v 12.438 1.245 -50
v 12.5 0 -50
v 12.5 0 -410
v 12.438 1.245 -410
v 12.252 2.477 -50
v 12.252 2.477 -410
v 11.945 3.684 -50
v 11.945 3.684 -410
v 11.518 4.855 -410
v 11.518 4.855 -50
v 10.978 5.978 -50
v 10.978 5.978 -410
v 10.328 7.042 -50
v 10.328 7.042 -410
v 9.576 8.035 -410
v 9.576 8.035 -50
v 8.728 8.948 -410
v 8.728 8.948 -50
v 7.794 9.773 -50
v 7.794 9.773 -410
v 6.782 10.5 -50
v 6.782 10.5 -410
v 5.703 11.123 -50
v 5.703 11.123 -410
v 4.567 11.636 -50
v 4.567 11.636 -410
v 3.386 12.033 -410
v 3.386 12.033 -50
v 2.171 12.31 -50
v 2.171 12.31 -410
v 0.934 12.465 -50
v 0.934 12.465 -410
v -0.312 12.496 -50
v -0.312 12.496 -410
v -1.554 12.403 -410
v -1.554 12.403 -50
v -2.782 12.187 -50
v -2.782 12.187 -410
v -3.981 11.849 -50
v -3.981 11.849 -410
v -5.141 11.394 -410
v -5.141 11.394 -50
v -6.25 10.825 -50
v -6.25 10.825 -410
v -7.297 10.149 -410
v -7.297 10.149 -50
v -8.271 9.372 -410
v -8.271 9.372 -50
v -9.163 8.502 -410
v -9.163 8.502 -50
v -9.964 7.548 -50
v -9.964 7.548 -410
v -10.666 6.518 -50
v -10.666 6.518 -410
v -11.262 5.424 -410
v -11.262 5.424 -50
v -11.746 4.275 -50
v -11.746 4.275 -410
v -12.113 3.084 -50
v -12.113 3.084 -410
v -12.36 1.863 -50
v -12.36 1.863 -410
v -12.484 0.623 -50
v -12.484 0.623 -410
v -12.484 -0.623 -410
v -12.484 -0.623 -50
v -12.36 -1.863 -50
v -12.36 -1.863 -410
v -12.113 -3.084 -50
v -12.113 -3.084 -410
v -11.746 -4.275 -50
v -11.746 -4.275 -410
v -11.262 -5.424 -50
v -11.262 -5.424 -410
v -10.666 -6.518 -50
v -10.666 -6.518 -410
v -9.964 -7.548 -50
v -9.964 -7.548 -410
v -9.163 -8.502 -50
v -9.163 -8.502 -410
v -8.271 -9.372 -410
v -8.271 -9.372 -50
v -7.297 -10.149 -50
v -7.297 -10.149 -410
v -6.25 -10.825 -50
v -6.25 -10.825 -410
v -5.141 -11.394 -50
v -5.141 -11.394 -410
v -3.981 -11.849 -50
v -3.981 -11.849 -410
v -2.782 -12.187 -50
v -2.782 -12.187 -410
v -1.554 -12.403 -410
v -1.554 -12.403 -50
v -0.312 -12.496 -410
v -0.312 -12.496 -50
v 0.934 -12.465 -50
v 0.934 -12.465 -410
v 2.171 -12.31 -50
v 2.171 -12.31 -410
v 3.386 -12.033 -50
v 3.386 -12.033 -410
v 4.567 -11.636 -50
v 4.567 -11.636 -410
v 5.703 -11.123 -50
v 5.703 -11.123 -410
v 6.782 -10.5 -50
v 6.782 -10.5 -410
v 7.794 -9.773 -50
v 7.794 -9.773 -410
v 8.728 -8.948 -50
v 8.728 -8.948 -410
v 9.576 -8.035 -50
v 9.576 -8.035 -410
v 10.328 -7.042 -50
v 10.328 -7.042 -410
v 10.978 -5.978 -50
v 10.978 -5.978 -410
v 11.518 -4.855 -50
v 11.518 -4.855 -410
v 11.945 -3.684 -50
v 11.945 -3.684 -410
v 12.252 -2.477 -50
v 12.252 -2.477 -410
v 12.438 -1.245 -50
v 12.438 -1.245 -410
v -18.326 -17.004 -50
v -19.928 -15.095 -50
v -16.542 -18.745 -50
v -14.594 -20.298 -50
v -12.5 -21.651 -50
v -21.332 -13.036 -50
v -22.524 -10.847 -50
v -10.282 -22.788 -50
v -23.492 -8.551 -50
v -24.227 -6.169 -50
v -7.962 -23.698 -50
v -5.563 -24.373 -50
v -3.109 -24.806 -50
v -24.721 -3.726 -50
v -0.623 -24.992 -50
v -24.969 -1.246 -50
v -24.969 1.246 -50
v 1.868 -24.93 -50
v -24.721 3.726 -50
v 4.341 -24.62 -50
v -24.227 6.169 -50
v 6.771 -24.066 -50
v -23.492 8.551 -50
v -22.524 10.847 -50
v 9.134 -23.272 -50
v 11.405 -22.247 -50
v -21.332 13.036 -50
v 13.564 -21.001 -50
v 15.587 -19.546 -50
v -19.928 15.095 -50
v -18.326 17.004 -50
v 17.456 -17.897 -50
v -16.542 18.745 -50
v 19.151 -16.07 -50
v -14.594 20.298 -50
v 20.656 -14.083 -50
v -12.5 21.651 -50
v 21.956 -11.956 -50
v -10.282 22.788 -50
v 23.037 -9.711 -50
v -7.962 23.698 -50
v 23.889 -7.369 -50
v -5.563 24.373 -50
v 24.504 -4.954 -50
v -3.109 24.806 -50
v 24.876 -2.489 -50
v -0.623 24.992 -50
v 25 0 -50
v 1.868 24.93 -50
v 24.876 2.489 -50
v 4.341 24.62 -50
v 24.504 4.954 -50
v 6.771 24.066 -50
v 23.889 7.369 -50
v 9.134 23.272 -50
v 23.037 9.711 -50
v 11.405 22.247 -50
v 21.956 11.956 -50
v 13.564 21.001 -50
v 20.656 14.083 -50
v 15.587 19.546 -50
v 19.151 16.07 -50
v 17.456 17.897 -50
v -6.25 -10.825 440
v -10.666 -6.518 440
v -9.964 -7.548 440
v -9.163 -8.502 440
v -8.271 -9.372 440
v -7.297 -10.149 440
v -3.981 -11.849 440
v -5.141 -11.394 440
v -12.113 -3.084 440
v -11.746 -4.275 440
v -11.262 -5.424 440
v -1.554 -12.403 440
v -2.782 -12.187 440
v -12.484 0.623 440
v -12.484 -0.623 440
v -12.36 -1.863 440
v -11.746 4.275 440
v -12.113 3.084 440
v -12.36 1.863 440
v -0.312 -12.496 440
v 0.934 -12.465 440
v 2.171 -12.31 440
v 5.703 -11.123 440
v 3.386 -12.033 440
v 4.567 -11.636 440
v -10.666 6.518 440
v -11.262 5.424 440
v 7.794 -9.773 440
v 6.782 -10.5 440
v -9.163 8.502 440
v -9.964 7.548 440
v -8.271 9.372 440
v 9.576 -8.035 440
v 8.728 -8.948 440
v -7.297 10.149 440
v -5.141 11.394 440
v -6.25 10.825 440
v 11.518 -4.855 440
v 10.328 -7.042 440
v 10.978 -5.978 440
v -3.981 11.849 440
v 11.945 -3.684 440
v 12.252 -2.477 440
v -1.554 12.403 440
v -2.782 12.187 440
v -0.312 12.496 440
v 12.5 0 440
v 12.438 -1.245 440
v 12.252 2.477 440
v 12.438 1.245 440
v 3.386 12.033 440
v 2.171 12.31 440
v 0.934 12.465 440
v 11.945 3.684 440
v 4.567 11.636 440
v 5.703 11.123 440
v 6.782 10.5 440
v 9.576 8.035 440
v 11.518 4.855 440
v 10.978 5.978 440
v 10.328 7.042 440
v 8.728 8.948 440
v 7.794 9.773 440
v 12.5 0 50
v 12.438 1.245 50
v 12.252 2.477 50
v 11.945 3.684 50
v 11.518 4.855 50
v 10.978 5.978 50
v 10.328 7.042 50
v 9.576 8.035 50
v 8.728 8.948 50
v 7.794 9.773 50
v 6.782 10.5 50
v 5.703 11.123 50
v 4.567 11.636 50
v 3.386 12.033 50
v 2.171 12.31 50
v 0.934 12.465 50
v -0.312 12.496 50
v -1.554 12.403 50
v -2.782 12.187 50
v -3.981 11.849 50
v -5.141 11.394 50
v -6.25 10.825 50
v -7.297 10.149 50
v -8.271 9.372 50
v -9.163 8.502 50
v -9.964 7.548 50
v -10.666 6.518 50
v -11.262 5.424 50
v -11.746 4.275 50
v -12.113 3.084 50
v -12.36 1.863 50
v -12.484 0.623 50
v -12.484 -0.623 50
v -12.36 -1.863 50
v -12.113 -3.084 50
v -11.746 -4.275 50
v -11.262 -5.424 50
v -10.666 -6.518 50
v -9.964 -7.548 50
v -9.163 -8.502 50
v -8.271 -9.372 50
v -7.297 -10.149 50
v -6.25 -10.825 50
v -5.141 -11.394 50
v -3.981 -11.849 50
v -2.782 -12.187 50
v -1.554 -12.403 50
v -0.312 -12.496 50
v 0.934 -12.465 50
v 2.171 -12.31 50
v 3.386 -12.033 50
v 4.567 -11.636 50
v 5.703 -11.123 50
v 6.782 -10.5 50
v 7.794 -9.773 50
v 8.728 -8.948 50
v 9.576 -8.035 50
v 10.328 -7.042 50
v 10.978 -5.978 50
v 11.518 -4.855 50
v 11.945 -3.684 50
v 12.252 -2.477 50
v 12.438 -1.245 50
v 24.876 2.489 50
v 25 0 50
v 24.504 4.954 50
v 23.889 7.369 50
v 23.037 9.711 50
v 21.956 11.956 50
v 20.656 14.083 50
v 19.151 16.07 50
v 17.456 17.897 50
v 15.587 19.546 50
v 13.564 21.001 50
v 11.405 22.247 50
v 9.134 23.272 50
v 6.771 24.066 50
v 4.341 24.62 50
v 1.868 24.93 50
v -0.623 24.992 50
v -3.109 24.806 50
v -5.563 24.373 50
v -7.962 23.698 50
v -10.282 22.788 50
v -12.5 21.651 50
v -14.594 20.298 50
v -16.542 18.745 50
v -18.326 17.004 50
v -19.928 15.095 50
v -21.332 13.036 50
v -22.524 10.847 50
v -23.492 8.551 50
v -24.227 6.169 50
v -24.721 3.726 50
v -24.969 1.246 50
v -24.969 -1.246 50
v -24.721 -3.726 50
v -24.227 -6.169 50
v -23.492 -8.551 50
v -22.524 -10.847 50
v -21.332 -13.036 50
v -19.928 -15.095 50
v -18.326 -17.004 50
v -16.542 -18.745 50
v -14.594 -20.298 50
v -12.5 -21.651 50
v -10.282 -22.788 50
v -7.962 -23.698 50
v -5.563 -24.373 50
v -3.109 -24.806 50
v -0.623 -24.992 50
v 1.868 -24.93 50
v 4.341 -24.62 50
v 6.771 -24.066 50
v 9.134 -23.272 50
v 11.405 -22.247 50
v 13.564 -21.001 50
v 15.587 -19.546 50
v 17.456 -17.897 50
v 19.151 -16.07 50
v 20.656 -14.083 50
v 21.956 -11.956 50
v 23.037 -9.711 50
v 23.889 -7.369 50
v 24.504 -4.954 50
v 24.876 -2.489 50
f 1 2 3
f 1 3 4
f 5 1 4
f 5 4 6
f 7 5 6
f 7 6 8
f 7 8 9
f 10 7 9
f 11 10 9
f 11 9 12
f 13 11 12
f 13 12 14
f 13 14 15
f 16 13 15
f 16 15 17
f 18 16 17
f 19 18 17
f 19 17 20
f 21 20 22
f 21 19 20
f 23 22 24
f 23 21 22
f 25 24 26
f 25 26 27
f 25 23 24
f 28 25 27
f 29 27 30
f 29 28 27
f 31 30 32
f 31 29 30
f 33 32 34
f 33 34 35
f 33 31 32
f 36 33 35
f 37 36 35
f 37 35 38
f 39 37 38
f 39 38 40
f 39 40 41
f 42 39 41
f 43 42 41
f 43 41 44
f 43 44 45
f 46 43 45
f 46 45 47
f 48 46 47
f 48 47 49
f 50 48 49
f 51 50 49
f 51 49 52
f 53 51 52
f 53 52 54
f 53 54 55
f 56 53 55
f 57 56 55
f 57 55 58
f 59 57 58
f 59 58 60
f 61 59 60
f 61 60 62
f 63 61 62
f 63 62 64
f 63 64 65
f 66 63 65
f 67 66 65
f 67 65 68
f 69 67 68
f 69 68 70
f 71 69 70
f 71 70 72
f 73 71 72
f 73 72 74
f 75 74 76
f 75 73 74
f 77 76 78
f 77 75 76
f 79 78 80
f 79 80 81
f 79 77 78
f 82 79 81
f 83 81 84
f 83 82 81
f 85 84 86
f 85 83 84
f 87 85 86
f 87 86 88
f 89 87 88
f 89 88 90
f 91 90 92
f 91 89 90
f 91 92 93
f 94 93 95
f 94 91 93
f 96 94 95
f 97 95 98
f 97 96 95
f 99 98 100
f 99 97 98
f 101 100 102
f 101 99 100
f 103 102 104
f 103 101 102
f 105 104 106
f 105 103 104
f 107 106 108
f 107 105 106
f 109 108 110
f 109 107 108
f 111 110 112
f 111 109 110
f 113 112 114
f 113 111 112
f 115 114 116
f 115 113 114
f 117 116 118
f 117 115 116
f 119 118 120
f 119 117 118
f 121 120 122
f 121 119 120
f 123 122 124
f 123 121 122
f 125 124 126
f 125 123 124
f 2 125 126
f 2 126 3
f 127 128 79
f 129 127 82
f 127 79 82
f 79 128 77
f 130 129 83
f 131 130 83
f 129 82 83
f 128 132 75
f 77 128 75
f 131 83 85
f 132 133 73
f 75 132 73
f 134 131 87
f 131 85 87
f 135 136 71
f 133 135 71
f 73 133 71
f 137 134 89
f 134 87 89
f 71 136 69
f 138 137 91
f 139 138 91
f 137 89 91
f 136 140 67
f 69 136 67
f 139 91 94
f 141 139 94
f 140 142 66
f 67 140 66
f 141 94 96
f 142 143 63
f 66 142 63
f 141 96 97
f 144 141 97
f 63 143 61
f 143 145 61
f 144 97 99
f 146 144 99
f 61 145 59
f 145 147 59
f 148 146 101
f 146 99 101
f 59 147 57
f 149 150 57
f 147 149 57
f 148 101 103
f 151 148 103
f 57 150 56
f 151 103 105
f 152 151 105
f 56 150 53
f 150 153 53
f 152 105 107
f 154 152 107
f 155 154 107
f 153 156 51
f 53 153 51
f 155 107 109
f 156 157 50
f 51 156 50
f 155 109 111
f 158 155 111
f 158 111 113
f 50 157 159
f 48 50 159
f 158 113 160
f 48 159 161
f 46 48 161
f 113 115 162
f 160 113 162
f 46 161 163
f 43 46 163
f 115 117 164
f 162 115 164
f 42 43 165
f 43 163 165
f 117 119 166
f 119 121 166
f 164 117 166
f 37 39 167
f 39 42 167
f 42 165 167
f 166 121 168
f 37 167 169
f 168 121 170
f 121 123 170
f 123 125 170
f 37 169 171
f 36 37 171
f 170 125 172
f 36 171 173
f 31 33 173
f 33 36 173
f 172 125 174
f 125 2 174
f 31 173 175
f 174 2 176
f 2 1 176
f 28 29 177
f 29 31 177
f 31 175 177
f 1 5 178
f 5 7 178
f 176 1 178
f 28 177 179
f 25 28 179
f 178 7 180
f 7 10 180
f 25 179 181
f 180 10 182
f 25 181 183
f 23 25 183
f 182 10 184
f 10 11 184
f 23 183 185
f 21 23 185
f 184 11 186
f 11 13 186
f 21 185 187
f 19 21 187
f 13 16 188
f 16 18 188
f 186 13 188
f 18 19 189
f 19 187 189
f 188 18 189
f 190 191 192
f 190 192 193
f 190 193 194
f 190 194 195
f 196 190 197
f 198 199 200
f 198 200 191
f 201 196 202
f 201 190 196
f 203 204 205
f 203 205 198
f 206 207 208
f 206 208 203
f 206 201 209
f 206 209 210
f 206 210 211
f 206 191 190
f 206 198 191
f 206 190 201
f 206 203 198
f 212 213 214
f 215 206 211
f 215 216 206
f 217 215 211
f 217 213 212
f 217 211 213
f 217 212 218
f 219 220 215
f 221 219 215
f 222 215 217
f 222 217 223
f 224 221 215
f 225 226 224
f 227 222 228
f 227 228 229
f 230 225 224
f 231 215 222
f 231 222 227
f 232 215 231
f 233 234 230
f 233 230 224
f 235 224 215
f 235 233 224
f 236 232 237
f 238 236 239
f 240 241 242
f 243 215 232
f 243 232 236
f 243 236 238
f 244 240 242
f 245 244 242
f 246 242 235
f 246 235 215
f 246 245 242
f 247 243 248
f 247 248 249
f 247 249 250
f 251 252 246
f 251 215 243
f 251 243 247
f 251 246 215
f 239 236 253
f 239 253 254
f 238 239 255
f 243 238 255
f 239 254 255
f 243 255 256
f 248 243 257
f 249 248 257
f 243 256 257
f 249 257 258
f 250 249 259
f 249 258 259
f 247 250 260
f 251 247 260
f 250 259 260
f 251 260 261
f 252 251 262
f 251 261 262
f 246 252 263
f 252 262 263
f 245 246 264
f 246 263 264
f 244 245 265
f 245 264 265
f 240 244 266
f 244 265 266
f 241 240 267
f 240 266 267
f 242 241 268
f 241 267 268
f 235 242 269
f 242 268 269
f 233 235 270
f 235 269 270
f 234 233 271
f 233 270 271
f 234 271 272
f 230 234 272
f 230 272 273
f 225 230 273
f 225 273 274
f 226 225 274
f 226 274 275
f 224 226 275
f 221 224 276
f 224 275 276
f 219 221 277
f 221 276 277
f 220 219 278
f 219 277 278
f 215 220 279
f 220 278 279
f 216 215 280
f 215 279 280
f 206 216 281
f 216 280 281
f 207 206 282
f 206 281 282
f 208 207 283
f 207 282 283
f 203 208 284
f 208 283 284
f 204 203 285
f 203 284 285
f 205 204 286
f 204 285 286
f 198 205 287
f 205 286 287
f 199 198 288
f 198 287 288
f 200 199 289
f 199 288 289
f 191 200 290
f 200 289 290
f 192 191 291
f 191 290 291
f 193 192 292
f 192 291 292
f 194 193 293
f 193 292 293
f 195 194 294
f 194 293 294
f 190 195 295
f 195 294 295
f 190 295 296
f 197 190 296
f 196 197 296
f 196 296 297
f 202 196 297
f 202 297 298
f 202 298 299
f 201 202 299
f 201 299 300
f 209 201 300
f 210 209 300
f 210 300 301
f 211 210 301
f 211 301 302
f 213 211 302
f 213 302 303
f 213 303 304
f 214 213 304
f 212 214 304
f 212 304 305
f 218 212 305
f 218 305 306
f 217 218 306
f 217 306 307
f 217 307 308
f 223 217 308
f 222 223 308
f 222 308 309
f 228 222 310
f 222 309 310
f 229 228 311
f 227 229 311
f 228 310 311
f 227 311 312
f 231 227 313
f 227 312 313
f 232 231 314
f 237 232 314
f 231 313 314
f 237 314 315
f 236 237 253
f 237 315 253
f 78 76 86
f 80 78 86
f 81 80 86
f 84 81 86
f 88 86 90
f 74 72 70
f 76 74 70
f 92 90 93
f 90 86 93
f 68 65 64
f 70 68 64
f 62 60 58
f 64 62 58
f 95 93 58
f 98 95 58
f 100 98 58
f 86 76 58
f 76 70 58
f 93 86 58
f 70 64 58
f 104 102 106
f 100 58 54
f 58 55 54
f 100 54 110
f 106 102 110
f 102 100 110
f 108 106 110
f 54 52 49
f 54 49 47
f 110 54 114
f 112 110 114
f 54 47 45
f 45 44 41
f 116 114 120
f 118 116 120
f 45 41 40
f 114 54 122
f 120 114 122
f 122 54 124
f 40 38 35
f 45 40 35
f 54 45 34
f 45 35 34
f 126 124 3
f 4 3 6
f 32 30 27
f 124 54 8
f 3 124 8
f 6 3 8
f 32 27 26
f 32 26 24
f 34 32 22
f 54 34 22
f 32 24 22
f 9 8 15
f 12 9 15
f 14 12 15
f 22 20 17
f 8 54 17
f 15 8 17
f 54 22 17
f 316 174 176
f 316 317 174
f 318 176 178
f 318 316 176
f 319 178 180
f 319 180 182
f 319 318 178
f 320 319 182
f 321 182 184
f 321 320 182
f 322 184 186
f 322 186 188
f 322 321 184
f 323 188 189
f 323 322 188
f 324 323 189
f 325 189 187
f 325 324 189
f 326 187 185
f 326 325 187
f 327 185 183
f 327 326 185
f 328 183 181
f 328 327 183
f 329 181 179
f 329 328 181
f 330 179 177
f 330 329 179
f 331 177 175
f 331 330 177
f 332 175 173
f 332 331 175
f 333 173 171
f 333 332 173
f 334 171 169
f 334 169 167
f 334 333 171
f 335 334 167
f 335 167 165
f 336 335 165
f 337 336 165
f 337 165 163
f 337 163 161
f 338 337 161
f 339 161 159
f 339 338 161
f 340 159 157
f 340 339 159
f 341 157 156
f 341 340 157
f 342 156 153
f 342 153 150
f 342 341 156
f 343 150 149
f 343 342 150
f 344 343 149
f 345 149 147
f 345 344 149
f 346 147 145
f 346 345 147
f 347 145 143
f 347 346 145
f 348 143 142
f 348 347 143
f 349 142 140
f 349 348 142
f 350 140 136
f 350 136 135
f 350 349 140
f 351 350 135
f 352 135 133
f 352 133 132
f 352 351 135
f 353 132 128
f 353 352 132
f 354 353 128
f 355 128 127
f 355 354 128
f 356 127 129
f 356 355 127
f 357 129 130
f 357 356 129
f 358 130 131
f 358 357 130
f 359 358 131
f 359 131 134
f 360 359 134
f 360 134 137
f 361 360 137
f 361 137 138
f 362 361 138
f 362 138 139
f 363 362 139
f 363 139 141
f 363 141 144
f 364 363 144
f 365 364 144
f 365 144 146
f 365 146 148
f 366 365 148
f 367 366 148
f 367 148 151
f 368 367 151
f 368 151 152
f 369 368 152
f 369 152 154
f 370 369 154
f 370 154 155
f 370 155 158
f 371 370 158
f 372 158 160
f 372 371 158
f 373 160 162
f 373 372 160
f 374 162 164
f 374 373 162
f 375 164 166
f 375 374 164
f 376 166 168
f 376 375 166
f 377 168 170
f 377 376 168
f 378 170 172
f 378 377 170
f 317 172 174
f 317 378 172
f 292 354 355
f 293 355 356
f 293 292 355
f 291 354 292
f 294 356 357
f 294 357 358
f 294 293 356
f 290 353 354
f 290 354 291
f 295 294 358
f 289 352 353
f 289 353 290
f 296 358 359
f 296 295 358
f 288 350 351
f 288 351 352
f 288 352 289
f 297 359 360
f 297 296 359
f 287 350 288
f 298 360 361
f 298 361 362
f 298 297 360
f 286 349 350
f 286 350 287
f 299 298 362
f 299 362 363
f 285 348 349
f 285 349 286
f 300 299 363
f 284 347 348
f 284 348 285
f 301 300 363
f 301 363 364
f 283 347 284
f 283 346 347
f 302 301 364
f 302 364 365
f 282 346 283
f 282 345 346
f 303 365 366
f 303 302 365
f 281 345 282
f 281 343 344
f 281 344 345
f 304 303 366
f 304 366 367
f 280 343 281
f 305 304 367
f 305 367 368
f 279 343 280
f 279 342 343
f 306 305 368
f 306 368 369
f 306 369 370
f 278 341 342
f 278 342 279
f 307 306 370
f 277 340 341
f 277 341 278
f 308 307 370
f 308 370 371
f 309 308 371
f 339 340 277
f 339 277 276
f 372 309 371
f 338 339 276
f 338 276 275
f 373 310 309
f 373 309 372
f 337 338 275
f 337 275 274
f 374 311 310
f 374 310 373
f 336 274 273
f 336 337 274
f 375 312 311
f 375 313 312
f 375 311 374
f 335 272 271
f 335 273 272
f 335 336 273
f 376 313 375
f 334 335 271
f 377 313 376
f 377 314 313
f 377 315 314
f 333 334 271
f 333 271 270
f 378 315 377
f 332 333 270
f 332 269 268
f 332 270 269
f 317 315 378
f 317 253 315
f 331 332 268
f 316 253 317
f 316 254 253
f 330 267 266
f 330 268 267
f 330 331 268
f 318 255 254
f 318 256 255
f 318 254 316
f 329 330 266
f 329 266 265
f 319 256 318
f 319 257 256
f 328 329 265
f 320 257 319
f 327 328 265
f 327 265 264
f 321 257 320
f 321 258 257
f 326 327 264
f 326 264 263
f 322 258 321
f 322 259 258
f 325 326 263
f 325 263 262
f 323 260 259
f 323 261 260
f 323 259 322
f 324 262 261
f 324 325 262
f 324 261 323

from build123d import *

# Parameters (mm, degrees)
BOSS_EXTRUDE1_DEPTH      = 50
BOSS_EXTRUDE1_DEPTH_BACK = 50
SKETCH1_R                = 25
SKETCH1_R_2              = 12.5
BOSS_EXTRUDE3_DEPTH      = 390
BOSS_EXTRUDE3_DEPTH_BACK = 460
SKETCH3_R                = 12.5


with BuildPart() as part:
    # Sketch1 → Boss-Extrude1 (new, two sides: drawn at the far end of the back side and taken through both)
    with BuildSketch(Plane.XY.offset(-BOSS_EXTRUDE1_DEPTH_BACK)):
        Circle(SKETCH1_R)
        Circle(SKETCH1_R_2, mode=Mode.SUBTRACT)
    extrude(amount=BOSS_EXTRUDE1_DEPTH + BOSS_EXTRUDE1_DEPTH_BACK)

    # Sketch3 → Boss-Extrude3 (add, two sides: drawn at the far end of the back side and taken through both)
    with BuildSketch(Plane.XY.offset(50).offset(-BOSS_EXTRUDE3_DEPTH_BACK)):
        Circle(SKETCH3_R)
    extrude(amount=BOSS_EXTRUDE3_DEPTH + BOSS_EXTRUDE3_DEPTH_BACK)


solid = part.part
